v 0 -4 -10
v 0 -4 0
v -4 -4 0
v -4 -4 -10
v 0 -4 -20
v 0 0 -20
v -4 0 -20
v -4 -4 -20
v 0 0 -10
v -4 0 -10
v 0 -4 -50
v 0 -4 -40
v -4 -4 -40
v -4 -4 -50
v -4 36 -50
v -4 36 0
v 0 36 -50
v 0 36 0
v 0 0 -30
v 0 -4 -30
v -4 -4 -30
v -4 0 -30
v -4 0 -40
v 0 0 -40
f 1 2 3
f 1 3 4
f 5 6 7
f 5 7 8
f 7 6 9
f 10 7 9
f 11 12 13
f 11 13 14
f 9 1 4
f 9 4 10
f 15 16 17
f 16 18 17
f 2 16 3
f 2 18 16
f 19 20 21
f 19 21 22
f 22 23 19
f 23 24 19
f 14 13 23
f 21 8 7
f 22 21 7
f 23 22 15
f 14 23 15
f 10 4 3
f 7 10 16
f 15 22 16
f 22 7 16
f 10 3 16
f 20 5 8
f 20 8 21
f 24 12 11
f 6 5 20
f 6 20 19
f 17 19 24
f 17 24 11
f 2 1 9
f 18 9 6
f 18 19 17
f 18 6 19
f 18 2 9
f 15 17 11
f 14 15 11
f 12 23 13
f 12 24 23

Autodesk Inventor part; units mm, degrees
ref_plane "YZ Plane" through (0, 0, 0) normal (1, 0, 0) x (0, 1, 0)
ref_plane "XZ Plane" through (0, 0, 0) normal (0, 1, 0) x (-1, 0, 0)
ref_plane "XY Plane" through (0, 0, 0) normal (0, 0, 1) x (1, 0, 0)
sketch "Sketch1" plane through (0, 0, 0) normal (1, 0, 0) x (0, 1, 0)
  line L0 (0, 0) -> (-4, 0)
  line L1 (0, 0) -> (36, 0)
  line L2 (36, 0) -> (36, -50)
  line L3 (36, -50) -> (0, -50)
  line L4 (0, -50) -> (0, 0)
  line L5 (-4, 0) -> (-4, -10)
  line L6 (-4, -20) -> (-4, -30)
  line L7 (0, -20) -> (0, -10)
  line L8 (-4, -10) -> (0, -10)
  line L9 (0, -20) -> (-4, -20)
  line L10 (-4, -40) -> (-4, -50)
  line L11 (0, -40) -> (0, -30)
  line L12 (-4, -30) -> (0, -30)
  line L13 (0, -40) -> (-4, -40)
  line L14 (-4, -50) -> (0, -50)
  dimension "d230" = 36
  dimension "d231" = 50
  dimension "d236" = 10
  dimension "d240" = 10
  dimension "d241" = 4
extrude "Extrusion1" add sketch "Sketch1" against normal blind 4
properties part number "Langbektang houder"
